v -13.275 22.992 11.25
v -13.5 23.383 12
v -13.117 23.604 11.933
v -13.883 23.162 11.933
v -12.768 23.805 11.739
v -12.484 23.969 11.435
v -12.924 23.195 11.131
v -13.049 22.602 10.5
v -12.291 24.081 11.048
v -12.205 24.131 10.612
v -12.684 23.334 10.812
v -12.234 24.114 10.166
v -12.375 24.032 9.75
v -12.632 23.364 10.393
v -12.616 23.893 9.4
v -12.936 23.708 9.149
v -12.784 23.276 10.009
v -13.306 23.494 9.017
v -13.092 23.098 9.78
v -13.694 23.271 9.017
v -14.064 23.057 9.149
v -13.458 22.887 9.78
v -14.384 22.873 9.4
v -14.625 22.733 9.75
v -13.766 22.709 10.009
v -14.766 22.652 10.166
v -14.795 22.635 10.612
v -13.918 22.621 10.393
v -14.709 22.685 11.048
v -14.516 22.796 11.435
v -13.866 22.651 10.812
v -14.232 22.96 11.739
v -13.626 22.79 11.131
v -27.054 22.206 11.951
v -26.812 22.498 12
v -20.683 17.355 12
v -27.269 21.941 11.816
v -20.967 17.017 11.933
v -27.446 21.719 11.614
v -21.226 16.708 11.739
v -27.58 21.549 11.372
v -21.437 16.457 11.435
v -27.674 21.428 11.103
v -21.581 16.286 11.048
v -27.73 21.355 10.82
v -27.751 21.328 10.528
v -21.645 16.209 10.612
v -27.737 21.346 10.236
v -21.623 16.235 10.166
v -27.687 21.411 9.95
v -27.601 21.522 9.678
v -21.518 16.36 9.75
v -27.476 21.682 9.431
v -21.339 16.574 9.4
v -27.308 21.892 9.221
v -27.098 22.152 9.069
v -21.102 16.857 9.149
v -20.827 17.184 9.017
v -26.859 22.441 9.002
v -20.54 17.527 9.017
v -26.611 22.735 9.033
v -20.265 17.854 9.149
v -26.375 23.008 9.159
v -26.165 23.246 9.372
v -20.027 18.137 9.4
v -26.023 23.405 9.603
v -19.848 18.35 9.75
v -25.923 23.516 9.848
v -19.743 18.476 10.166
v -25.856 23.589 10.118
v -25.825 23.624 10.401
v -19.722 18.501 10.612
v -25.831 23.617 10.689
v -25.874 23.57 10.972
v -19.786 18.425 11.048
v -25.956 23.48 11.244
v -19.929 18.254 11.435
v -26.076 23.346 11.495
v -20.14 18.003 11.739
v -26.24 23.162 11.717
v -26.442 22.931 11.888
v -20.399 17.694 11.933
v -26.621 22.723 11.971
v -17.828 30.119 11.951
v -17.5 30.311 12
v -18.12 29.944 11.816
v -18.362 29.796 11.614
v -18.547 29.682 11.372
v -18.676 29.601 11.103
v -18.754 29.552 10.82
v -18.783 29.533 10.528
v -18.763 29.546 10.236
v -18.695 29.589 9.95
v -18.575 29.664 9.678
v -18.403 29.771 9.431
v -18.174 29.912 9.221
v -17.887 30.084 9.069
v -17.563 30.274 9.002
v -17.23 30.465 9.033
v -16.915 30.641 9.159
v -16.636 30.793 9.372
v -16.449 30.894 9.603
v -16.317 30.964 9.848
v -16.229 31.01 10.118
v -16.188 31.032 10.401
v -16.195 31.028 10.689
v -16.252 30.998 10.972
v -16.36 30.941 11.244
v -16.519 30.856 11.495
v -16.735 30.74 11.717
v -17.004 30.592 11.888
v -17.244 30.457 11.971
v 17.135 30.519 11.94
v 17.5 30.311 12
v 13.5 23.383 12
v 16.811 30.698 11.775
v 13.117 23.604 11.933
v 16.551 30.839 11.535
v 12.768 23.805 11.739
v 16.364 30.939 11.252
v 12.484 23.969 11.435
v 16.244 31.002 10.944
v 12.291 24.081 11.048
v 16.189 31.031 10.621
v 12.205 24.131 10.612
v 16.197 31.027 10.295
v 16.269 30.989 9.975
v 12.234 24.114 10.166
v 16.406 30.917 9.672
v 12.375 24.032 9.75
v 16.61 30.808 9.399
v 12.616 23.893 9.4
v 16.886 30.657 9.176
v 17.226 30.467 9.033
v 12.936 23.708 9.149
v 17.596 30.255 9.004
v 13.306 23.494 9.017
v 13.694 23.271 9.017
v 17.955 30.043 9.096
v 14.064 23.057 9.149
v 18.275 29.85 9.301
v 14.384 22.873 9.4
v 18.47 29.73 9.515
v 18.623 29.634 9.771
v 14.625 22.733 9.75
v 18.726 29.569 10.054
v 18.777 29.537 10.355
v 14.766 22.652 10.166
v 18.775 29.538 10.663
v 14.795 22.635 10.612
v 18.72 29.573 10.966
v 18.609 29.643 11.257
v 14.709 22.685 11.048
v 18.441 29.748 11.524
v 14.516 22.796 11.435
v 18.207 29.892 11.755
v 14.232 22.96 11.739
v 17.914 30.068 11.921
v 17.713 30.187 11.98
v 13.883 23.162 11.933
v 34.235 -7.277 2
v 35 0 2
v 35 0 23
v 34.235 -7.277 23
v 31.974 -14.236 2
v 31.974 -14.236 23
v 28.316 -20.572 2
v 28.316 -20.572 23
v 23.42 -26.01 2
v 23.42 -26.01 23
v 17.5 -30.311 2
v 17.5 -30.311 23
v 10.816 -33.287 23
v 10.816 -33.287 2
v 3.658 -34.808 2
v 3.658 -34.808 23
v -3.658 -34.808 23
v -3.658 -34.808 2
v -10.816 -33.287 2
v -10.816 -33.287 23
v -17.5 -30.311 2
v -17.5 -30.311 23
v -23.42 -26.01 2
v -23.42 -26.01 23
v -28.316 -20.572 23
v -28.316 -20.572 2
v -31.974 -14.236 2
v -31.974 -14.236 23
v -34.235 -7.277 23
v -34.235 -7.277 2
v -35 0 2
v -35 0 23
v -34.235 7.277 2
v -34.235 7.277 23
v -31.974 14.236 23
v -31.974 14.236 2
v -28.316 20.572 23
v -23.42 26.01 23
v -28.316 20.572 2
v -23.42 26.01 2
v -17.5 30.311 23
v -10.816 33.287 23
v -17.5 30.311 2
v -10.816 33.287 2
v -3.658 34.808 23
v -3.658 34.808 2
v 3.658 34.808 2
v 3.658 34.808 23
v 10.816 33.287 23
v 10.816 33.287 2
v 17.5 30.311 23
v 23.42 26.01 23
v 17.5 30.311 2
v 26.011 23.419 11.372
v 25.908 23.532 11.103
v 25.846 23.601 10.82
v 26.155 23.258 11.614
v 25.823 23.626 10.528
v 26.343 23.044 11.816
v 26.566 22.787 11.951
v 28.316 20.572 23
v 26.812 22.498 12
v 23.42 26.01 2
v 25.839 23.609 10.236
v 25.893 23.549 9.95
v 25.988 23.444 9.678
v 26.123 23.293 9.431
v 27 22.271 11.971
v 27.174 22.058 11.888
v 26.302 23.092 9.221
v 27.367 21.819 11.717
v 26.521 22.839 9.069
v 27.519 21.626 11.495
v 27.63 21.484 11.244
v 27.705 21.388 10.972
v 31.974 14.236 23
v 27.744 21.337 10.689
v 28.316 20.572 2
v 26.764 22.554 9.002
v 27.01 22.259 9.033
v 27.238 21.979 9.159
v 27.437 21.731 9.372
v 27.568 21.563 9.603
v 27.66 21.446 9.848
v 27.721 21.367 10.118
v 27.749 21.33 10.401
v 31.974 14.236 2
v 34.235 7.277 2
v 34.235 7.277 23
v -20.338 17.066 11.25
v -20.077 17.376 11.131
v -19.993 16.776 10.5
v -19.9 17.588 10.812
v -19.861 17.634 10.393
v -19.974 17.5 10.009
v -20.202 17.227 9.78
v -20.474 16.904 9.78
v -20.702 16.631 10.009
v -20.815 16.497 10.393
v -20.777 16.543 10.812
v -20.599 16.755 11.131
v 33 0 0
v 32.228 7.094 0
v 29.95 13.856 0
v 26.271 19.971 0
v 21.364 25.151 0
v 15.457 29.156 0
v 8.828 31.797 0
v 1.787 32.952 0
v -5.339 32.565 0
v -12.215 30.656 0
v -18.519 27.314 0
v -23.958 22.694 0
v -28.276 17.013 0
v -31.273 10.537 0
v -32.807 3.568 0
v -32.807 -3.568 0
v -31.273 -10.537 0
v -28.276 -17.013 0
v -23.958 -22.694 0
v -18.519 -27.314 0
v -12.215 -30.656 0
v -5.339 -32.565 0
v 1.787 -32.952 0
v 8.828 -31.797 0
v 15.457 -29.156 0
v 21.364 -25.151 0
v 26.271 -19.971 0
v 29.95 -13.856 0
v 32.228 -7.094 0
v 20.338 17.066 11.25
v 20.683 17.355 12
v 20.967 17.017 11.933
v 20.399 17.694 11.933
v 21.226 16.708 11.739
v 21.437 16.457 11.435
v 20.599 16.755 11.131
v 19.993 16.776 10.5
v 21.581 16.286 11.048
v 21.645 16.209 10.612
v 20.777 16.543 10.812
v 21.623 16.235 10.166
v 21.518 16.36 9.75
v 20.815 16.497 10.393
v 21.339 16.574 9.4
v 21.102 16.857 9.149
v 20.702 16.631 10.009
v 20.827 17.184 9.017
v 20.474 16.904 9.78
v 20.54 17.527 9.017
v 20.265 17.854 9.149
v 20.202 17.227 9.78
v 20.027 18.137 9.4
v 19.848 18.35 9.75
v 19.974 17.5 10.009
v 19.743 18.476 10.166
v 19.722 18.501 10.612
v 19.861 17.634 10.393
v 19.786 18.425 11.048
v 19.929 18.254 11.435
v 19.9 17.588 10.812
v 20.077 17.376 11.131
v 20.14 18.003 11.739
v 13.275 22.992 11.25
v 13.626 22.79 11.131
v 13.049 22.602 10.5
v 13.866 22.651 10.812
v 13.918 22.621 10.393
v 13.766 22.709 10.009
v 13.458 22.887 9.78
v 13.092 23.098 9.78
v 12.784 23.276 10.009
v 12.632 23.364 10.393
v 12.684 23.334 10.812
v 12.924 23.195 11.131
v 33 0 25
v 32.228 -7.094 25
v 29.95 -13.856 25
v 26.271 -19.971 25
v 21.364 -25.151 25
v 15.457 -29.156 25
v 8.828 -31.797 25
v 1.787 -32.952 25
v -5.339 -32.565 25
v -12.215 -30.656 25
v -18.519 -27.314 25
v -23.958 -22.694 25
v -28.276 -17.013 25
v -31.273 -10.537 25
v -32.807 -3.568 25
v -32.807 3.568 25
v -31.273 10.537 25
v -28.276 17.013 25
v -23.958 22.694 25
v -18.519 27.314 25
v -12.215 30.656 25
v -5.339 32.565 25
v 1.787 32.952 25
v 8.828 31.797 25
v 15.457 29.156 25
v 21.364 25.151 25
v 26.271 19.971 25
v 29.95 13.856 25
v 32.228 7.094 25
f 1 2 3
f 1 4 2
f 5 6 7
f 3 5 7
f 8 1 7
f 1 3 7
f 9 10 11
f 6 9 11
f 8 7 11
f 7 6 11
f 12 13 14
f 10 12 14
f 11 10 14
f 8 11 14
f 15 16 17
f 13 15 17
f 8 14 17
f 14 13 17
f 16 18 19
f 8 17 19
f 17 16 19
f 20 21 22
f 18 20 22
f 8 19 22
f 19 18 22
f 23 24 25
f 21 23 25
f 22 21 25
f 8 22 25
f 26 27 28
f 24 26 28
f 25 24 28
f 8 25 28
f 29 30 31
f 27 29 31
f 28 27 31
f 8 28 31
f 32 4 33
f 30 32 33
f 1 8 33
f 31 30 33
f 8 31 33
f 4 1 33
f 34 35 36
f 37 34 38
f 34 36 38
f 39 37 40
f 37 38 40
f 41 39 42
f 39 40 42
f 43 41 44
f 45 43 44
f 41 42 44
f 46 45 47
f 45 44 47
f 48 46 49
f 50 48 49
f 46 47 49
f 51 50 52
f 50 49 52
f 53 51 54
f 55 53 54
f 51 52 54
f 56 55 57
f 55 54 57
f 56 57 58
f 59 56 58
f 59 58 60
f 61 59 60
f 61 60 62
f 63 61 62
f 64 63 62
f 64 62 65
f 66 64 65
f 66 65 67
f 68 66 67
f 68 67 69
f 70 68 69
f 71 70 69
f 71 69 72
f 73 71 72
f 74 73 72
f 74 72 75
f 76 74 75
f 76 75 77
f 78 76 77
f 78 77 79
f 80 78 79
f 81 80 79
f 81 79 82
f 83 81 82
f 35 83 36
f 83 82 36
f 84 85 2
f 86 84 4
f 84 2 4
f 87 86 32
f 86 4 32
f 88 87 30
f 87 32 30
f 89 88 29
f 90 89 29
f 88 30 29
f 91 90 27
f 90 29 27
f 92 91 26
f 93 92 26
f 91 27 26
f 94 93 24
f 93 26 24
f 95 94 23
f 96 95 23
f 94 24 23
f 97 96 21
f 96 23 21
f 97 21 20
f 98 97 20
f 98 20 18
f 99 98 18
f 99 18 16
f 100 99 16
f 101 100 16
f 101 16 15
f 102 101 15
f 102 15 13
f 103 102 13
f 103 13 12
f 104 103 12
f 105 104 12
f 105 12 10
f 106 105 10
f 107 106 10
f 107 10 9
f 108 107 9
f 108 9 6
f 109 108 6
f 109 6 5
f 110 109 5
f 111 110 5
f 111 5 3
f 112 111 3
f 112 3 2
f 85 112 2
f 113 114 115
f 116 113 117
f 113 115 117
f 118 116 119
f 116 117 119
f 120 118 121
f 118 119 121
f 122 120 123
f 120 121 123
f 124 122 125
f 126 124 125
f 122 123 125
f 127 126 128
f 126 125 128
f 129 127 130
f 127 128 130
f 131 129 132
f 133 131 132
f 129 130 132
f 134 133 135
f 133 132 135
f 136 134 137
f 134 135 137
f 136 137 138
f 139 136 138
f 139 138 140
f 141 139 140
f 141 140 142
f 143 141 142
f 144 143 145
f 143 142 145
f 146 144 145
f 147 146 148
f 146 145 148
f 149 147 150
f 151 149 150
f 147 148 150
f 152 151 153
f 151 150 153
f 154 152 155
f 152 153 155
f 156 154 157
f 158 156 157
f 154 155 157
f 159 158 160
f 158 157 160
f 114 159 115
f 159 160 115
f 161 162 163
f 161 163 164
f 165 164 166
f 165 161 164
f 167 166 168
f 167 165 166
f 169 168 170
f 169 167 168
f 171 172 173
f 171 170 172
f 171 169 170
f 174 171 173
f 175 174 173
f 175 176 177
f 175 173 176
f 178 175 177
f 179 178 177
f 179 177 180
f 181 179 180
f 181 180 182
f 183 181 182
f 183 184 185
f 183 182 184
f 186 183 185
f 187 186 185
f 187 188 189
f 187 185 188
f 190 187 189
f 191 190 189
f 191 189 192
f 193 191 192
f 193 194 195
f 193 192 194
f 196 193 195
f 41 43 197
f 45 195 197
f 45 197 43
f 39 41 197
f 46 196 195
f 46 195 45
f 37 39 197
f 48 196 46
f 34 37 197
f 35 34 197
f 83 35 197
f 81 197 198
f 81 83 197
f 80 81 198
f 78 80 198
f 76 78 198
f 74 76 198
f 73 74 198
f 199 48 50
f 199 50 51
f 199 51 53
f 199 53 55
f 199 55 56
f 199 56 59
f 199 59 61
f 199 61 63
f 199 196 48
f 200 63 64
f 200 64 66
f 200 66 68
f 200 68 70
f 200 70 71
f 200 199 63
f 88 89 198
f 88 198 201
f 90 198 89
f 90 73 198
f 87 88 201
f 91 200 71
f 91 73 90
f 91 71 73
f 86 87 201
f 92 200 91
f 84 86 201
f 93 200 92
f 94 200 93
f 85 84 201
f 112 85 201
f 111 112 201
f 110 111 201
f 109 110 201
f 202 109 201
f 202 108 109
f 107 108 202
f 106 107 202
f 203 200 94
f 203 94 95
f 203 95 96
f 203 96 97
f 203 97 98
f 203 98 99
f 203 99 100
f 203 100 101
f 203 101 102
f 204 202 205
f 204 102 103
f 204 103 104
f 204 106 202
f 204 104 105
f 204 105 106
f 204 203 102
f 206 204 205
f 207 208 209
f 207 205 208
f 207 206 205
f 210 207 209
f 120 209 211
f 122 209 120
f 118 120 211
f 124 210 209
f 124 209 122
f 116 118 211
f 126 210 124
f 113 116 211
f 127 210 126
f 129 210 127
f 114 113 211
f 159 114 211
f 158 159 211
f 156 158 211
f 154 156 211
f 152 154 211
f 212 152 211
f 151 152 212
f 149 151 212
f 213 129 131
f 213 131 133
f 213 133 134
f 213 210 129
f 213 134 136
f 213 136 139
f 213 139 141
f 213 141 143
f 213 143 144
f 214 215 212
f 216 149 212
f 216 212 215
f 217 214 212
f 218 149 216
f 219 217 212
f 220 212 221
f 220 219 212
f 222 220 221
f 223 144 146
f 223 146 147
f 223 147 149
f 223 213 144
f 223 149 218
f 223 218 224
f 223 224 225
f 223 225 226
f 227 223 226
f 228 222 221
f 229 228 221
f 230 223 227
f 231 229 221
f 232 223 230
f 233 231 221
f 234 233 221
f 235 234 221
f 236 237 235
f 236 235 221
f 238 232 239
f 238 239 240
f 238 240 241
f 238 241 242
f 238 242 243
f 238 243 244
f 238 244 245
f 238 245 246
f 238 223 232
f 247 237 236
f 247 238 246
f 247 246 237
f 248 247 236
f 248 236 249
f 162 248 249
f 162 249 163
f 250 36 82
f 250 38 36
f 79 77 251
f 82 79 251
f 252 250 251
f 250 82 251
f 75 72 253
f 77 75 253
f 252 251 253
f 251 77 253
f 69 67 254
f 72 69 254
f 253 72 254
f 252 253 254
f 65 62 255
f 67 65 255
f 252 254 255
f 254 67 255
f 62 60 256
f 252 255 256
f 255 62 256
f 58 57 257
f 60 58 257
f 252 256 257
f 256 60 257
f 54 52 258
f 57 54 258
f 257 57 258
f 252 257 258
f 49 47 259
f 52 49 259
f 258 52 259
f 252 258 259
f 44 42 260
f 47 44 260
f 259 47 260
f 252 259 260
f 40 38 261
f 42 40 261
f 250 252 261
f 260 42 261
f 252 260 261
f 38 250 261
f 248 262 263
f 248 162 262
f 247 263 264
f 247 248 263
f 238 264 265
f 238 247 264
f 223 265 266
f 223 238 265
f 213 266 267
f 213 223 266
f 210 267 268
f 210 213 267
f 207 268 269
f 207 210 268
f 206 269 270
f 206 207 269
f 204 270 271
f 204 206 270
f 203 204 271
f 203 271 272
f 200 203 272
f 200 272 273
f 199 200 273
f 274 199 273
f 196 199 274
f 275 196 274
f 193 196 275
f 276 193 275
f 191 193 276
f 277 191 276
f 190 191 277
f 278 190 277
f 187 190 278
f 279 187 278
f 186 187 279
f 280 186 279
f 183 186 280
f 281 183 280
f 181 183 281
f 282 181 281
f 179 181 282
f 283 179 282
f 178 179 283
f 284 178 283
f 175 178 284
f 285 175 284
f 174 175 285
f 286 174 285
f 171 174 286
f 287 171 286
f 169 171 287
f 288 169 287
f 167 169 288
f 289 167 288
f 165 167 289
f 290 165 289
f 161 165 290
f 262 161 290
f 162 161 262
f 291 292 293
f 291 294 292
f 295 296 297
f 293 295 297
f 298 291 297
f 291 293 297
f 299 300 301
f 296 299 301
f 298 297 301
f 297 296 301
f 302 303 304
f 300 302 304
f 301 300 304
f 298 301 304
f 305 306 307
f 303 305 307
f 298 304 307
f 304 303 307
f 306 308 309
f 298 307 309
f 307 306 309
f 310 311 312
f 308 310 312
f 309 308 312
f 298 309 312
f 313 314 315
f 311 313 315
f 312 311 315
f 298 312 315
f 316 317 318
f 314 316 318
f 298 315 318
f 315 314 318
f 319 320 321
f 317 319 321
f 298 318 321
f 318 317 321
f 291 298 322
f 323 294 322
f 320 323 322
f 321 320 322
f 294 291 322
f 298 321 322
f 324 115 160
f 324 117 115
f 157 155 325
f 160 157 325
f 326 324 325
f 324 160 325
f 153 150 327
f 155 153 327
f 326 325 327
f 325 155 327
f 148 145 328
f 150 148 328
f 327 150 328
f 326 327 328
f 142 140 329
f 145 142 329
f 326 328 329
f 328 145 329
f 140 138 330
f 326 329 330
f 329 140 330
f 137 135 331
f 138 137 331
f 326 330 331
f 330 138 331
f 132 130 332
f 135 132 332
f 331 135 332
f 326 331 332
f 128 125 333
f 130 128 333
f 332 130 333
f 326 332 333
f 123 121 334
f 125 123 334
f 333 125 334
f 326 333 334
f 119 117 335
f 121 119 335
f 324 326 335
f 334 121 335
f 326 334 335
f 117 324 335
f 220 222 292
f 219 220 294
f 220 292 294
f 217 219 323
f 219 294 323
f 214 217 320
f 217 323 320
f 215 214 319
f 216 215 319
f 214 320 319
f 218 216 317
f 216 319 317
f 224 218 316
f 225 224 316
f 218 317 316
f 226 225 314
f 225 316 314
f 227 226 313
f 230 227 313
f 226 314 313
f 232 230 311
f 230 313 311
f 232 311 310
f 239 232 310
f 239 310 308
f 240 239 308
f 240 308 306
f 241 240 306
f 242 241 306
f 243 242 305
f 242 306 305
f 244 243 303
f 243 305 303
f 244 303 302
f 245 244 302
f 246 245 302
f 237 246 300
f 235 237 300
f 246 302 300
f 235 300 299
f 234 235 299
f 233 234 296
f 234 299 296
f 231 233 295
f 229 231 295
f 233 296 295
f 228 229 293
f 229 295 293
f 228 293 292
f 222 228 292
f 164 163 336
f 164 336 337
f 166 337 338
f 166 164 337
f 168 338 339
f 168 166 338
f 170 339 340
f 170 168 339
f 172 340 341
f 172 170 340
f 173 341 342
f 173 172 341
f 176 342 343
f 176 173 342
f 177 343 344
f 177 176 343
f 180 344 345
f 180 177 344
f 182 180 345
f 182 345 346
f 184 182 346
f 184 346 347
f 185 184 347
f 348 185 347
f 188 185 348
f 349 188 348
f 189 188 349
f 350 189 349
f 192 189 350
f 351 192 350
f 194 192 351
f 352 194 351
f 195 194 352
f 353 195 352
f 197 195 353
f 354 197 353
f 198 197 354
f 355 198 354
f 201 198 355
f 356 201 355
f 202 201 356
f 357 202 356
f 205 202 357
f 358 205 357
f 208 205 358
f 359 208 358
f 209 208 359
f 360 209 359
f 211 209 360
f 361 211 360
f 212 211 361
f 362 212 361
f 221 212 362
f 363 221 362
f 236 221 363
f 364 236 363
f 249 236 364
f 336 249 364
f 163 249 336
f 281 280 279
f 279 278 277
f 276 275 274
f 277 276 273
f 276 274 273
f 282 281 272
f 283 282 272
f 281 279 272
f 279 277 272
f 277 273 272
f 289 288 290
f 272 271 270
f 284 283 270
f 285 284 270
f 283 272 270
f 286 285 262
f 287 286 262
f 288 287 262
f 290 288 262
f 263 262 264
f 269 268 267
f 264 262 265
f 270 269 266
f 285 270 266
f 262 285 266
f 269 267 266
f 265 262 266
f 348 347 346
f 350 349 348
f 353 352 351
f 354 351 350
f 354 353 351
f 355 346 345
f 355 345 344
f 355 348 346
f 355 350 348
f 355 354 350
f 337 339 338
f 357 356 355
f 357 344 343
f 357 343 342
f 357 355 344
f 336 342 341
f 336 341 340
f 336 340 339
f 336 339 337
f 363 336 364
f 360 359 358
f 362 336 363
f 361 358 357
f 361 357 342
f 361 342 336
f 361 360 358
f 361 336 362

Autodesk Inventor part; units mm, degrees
sketch "Sketch1" plane through (0, 0, 0) normal (0, 0, 1) x (1, 0, 0)
  circle A0 centre (0, 0) radius 35
  dimension "d0" = 70
extrude "Extrusion1" add sketch "Sketch1" along normal blind 25
chamfer "Chamfer1" distance 2 angle 45 2 edges at (-35, 0, 25) (-35, 0, 0)
sketch "Sketch2" plane through (0, 0, 25) normal (0, 0, 1) x (1, 0, 0)
  line L0 (0, 0) -> (0, 35) construction
  circle A0 centre (0, 0) radius 35 construction
  line L1 (0, 0) -> (35, 0) construction
  line L2 (0, 0) -> (26.8116, 22.4976) construction
  line L3 (0, 0) -> (35, 0) construction
  line L4 (0, 0) -> (17.5, 30.3109) construction
  line L5 (0, 0) -> (35, 0) construction
  line L6 (0, 0) -> (-26.8116, 22.4976) construction
  line L7 (0, 0) -> (-17.5, 30.3109) construction
  dimension "d6" = 40
  dimension "d7" = 60
  dimension "d48" = 60
ref_plane "Work Plane1" through (26.8116, 22.4976, 25) normal (0.766, 0.6428, 0) x (-0.6428, 0.766, 0)
ref_plane "Work Plane2" through (17.5, 30.3109, 25) normal (0.5, 0.866, 0) x (-0.866, 0.5, 0)
ref_plane "Work Plane3" through (-17.5, 30.3109, 25) normal (-0.5, 0.866, 0) x (-0.866, -0.5, 0)
ref_plane "Work Plane4" through (-26.8116, 22.4976, 25) normal (-0.766, 0.6428, 0) x (-0.6428, -0.766, 0)
sketch "Sketch3" plane through (26.8116, 22.4976, 25) normal (0.766, 0.6428, 0) x (-0.6428, 0.766, 0)
  line L0 (-33, 0) -> (33, 0) projected
  point P0 (0, -25)
  point P1 (0, -14.5)
  dimension "d8" = 14.5
sketch "Sketch4" plane through (17.5, 30.3109, 25) normal (0.5, 0.866, 0) x (-0.866, 0.5, 0)
  line L0 (-33, 0) -> (33, 0) projected
  point P0 (0, -25)
  point P1 (0, -14.5)
  dimension "d9" = 14.5
sketch "Sketch5" plane through (-17.5, 30.3109, 25) normal (-0.5, 0.866, 0) x (-0.866, -0.5, 0)
  line L0 (-33, 0) -> (33, 0) projected
  point P0 (0, -25)
  point P1 (0, -14.5)
  dimension "d10" = 14.5
sketch "Sketch6" plane through (-26.8116, 22.4976, 25) normal (-0.766, 0.6428, 0) x (-0.6428, -0.766, 0)
  line L0 (-33, 0) -> (33, 0) projected
  point P0 (0, -25)
  point P1 (0, -14.5)
  dimension "d11" = 14.5
hole "Hole1" at (-26.8116, 22.4976, 10.5) direction (0.766, -0.6428, 0) diameter 3 depth 8 tip angle 118
hole "Hole2" at (-17.5, 30.3109, 10.5) direction (0.5, -0.866, 0) diameter 3 depth 8 tip angle 118
hole "Hole3" at (17.5, 30.3109, 10.5) direction (-0.5, -0.866, 0) diameter 3 depth 8 tip angle 118
hole "Hole4" at (26.8116, 22.4976, 10.5) direction (-0.766, -0.6428, 0) diameter 3 depth 8 tip angle 118
thread "Thread1" size "M3x0.5" class "6H" standard "ANSI Metric M Profile" full length
thread "Thread2" size "M3x0.5" class "6H" standard "ANSI Metric M Profile" full length
thread "Thread3" size "M3x0.5" class "6H" standard "ANSI Metric M Profile" full length
thread "Thread4" size "M3x0.5" class "6H" standard "ANSI Metric M Profile" full length
properties part number "dummy_disc" material "Aluminum 6061"
